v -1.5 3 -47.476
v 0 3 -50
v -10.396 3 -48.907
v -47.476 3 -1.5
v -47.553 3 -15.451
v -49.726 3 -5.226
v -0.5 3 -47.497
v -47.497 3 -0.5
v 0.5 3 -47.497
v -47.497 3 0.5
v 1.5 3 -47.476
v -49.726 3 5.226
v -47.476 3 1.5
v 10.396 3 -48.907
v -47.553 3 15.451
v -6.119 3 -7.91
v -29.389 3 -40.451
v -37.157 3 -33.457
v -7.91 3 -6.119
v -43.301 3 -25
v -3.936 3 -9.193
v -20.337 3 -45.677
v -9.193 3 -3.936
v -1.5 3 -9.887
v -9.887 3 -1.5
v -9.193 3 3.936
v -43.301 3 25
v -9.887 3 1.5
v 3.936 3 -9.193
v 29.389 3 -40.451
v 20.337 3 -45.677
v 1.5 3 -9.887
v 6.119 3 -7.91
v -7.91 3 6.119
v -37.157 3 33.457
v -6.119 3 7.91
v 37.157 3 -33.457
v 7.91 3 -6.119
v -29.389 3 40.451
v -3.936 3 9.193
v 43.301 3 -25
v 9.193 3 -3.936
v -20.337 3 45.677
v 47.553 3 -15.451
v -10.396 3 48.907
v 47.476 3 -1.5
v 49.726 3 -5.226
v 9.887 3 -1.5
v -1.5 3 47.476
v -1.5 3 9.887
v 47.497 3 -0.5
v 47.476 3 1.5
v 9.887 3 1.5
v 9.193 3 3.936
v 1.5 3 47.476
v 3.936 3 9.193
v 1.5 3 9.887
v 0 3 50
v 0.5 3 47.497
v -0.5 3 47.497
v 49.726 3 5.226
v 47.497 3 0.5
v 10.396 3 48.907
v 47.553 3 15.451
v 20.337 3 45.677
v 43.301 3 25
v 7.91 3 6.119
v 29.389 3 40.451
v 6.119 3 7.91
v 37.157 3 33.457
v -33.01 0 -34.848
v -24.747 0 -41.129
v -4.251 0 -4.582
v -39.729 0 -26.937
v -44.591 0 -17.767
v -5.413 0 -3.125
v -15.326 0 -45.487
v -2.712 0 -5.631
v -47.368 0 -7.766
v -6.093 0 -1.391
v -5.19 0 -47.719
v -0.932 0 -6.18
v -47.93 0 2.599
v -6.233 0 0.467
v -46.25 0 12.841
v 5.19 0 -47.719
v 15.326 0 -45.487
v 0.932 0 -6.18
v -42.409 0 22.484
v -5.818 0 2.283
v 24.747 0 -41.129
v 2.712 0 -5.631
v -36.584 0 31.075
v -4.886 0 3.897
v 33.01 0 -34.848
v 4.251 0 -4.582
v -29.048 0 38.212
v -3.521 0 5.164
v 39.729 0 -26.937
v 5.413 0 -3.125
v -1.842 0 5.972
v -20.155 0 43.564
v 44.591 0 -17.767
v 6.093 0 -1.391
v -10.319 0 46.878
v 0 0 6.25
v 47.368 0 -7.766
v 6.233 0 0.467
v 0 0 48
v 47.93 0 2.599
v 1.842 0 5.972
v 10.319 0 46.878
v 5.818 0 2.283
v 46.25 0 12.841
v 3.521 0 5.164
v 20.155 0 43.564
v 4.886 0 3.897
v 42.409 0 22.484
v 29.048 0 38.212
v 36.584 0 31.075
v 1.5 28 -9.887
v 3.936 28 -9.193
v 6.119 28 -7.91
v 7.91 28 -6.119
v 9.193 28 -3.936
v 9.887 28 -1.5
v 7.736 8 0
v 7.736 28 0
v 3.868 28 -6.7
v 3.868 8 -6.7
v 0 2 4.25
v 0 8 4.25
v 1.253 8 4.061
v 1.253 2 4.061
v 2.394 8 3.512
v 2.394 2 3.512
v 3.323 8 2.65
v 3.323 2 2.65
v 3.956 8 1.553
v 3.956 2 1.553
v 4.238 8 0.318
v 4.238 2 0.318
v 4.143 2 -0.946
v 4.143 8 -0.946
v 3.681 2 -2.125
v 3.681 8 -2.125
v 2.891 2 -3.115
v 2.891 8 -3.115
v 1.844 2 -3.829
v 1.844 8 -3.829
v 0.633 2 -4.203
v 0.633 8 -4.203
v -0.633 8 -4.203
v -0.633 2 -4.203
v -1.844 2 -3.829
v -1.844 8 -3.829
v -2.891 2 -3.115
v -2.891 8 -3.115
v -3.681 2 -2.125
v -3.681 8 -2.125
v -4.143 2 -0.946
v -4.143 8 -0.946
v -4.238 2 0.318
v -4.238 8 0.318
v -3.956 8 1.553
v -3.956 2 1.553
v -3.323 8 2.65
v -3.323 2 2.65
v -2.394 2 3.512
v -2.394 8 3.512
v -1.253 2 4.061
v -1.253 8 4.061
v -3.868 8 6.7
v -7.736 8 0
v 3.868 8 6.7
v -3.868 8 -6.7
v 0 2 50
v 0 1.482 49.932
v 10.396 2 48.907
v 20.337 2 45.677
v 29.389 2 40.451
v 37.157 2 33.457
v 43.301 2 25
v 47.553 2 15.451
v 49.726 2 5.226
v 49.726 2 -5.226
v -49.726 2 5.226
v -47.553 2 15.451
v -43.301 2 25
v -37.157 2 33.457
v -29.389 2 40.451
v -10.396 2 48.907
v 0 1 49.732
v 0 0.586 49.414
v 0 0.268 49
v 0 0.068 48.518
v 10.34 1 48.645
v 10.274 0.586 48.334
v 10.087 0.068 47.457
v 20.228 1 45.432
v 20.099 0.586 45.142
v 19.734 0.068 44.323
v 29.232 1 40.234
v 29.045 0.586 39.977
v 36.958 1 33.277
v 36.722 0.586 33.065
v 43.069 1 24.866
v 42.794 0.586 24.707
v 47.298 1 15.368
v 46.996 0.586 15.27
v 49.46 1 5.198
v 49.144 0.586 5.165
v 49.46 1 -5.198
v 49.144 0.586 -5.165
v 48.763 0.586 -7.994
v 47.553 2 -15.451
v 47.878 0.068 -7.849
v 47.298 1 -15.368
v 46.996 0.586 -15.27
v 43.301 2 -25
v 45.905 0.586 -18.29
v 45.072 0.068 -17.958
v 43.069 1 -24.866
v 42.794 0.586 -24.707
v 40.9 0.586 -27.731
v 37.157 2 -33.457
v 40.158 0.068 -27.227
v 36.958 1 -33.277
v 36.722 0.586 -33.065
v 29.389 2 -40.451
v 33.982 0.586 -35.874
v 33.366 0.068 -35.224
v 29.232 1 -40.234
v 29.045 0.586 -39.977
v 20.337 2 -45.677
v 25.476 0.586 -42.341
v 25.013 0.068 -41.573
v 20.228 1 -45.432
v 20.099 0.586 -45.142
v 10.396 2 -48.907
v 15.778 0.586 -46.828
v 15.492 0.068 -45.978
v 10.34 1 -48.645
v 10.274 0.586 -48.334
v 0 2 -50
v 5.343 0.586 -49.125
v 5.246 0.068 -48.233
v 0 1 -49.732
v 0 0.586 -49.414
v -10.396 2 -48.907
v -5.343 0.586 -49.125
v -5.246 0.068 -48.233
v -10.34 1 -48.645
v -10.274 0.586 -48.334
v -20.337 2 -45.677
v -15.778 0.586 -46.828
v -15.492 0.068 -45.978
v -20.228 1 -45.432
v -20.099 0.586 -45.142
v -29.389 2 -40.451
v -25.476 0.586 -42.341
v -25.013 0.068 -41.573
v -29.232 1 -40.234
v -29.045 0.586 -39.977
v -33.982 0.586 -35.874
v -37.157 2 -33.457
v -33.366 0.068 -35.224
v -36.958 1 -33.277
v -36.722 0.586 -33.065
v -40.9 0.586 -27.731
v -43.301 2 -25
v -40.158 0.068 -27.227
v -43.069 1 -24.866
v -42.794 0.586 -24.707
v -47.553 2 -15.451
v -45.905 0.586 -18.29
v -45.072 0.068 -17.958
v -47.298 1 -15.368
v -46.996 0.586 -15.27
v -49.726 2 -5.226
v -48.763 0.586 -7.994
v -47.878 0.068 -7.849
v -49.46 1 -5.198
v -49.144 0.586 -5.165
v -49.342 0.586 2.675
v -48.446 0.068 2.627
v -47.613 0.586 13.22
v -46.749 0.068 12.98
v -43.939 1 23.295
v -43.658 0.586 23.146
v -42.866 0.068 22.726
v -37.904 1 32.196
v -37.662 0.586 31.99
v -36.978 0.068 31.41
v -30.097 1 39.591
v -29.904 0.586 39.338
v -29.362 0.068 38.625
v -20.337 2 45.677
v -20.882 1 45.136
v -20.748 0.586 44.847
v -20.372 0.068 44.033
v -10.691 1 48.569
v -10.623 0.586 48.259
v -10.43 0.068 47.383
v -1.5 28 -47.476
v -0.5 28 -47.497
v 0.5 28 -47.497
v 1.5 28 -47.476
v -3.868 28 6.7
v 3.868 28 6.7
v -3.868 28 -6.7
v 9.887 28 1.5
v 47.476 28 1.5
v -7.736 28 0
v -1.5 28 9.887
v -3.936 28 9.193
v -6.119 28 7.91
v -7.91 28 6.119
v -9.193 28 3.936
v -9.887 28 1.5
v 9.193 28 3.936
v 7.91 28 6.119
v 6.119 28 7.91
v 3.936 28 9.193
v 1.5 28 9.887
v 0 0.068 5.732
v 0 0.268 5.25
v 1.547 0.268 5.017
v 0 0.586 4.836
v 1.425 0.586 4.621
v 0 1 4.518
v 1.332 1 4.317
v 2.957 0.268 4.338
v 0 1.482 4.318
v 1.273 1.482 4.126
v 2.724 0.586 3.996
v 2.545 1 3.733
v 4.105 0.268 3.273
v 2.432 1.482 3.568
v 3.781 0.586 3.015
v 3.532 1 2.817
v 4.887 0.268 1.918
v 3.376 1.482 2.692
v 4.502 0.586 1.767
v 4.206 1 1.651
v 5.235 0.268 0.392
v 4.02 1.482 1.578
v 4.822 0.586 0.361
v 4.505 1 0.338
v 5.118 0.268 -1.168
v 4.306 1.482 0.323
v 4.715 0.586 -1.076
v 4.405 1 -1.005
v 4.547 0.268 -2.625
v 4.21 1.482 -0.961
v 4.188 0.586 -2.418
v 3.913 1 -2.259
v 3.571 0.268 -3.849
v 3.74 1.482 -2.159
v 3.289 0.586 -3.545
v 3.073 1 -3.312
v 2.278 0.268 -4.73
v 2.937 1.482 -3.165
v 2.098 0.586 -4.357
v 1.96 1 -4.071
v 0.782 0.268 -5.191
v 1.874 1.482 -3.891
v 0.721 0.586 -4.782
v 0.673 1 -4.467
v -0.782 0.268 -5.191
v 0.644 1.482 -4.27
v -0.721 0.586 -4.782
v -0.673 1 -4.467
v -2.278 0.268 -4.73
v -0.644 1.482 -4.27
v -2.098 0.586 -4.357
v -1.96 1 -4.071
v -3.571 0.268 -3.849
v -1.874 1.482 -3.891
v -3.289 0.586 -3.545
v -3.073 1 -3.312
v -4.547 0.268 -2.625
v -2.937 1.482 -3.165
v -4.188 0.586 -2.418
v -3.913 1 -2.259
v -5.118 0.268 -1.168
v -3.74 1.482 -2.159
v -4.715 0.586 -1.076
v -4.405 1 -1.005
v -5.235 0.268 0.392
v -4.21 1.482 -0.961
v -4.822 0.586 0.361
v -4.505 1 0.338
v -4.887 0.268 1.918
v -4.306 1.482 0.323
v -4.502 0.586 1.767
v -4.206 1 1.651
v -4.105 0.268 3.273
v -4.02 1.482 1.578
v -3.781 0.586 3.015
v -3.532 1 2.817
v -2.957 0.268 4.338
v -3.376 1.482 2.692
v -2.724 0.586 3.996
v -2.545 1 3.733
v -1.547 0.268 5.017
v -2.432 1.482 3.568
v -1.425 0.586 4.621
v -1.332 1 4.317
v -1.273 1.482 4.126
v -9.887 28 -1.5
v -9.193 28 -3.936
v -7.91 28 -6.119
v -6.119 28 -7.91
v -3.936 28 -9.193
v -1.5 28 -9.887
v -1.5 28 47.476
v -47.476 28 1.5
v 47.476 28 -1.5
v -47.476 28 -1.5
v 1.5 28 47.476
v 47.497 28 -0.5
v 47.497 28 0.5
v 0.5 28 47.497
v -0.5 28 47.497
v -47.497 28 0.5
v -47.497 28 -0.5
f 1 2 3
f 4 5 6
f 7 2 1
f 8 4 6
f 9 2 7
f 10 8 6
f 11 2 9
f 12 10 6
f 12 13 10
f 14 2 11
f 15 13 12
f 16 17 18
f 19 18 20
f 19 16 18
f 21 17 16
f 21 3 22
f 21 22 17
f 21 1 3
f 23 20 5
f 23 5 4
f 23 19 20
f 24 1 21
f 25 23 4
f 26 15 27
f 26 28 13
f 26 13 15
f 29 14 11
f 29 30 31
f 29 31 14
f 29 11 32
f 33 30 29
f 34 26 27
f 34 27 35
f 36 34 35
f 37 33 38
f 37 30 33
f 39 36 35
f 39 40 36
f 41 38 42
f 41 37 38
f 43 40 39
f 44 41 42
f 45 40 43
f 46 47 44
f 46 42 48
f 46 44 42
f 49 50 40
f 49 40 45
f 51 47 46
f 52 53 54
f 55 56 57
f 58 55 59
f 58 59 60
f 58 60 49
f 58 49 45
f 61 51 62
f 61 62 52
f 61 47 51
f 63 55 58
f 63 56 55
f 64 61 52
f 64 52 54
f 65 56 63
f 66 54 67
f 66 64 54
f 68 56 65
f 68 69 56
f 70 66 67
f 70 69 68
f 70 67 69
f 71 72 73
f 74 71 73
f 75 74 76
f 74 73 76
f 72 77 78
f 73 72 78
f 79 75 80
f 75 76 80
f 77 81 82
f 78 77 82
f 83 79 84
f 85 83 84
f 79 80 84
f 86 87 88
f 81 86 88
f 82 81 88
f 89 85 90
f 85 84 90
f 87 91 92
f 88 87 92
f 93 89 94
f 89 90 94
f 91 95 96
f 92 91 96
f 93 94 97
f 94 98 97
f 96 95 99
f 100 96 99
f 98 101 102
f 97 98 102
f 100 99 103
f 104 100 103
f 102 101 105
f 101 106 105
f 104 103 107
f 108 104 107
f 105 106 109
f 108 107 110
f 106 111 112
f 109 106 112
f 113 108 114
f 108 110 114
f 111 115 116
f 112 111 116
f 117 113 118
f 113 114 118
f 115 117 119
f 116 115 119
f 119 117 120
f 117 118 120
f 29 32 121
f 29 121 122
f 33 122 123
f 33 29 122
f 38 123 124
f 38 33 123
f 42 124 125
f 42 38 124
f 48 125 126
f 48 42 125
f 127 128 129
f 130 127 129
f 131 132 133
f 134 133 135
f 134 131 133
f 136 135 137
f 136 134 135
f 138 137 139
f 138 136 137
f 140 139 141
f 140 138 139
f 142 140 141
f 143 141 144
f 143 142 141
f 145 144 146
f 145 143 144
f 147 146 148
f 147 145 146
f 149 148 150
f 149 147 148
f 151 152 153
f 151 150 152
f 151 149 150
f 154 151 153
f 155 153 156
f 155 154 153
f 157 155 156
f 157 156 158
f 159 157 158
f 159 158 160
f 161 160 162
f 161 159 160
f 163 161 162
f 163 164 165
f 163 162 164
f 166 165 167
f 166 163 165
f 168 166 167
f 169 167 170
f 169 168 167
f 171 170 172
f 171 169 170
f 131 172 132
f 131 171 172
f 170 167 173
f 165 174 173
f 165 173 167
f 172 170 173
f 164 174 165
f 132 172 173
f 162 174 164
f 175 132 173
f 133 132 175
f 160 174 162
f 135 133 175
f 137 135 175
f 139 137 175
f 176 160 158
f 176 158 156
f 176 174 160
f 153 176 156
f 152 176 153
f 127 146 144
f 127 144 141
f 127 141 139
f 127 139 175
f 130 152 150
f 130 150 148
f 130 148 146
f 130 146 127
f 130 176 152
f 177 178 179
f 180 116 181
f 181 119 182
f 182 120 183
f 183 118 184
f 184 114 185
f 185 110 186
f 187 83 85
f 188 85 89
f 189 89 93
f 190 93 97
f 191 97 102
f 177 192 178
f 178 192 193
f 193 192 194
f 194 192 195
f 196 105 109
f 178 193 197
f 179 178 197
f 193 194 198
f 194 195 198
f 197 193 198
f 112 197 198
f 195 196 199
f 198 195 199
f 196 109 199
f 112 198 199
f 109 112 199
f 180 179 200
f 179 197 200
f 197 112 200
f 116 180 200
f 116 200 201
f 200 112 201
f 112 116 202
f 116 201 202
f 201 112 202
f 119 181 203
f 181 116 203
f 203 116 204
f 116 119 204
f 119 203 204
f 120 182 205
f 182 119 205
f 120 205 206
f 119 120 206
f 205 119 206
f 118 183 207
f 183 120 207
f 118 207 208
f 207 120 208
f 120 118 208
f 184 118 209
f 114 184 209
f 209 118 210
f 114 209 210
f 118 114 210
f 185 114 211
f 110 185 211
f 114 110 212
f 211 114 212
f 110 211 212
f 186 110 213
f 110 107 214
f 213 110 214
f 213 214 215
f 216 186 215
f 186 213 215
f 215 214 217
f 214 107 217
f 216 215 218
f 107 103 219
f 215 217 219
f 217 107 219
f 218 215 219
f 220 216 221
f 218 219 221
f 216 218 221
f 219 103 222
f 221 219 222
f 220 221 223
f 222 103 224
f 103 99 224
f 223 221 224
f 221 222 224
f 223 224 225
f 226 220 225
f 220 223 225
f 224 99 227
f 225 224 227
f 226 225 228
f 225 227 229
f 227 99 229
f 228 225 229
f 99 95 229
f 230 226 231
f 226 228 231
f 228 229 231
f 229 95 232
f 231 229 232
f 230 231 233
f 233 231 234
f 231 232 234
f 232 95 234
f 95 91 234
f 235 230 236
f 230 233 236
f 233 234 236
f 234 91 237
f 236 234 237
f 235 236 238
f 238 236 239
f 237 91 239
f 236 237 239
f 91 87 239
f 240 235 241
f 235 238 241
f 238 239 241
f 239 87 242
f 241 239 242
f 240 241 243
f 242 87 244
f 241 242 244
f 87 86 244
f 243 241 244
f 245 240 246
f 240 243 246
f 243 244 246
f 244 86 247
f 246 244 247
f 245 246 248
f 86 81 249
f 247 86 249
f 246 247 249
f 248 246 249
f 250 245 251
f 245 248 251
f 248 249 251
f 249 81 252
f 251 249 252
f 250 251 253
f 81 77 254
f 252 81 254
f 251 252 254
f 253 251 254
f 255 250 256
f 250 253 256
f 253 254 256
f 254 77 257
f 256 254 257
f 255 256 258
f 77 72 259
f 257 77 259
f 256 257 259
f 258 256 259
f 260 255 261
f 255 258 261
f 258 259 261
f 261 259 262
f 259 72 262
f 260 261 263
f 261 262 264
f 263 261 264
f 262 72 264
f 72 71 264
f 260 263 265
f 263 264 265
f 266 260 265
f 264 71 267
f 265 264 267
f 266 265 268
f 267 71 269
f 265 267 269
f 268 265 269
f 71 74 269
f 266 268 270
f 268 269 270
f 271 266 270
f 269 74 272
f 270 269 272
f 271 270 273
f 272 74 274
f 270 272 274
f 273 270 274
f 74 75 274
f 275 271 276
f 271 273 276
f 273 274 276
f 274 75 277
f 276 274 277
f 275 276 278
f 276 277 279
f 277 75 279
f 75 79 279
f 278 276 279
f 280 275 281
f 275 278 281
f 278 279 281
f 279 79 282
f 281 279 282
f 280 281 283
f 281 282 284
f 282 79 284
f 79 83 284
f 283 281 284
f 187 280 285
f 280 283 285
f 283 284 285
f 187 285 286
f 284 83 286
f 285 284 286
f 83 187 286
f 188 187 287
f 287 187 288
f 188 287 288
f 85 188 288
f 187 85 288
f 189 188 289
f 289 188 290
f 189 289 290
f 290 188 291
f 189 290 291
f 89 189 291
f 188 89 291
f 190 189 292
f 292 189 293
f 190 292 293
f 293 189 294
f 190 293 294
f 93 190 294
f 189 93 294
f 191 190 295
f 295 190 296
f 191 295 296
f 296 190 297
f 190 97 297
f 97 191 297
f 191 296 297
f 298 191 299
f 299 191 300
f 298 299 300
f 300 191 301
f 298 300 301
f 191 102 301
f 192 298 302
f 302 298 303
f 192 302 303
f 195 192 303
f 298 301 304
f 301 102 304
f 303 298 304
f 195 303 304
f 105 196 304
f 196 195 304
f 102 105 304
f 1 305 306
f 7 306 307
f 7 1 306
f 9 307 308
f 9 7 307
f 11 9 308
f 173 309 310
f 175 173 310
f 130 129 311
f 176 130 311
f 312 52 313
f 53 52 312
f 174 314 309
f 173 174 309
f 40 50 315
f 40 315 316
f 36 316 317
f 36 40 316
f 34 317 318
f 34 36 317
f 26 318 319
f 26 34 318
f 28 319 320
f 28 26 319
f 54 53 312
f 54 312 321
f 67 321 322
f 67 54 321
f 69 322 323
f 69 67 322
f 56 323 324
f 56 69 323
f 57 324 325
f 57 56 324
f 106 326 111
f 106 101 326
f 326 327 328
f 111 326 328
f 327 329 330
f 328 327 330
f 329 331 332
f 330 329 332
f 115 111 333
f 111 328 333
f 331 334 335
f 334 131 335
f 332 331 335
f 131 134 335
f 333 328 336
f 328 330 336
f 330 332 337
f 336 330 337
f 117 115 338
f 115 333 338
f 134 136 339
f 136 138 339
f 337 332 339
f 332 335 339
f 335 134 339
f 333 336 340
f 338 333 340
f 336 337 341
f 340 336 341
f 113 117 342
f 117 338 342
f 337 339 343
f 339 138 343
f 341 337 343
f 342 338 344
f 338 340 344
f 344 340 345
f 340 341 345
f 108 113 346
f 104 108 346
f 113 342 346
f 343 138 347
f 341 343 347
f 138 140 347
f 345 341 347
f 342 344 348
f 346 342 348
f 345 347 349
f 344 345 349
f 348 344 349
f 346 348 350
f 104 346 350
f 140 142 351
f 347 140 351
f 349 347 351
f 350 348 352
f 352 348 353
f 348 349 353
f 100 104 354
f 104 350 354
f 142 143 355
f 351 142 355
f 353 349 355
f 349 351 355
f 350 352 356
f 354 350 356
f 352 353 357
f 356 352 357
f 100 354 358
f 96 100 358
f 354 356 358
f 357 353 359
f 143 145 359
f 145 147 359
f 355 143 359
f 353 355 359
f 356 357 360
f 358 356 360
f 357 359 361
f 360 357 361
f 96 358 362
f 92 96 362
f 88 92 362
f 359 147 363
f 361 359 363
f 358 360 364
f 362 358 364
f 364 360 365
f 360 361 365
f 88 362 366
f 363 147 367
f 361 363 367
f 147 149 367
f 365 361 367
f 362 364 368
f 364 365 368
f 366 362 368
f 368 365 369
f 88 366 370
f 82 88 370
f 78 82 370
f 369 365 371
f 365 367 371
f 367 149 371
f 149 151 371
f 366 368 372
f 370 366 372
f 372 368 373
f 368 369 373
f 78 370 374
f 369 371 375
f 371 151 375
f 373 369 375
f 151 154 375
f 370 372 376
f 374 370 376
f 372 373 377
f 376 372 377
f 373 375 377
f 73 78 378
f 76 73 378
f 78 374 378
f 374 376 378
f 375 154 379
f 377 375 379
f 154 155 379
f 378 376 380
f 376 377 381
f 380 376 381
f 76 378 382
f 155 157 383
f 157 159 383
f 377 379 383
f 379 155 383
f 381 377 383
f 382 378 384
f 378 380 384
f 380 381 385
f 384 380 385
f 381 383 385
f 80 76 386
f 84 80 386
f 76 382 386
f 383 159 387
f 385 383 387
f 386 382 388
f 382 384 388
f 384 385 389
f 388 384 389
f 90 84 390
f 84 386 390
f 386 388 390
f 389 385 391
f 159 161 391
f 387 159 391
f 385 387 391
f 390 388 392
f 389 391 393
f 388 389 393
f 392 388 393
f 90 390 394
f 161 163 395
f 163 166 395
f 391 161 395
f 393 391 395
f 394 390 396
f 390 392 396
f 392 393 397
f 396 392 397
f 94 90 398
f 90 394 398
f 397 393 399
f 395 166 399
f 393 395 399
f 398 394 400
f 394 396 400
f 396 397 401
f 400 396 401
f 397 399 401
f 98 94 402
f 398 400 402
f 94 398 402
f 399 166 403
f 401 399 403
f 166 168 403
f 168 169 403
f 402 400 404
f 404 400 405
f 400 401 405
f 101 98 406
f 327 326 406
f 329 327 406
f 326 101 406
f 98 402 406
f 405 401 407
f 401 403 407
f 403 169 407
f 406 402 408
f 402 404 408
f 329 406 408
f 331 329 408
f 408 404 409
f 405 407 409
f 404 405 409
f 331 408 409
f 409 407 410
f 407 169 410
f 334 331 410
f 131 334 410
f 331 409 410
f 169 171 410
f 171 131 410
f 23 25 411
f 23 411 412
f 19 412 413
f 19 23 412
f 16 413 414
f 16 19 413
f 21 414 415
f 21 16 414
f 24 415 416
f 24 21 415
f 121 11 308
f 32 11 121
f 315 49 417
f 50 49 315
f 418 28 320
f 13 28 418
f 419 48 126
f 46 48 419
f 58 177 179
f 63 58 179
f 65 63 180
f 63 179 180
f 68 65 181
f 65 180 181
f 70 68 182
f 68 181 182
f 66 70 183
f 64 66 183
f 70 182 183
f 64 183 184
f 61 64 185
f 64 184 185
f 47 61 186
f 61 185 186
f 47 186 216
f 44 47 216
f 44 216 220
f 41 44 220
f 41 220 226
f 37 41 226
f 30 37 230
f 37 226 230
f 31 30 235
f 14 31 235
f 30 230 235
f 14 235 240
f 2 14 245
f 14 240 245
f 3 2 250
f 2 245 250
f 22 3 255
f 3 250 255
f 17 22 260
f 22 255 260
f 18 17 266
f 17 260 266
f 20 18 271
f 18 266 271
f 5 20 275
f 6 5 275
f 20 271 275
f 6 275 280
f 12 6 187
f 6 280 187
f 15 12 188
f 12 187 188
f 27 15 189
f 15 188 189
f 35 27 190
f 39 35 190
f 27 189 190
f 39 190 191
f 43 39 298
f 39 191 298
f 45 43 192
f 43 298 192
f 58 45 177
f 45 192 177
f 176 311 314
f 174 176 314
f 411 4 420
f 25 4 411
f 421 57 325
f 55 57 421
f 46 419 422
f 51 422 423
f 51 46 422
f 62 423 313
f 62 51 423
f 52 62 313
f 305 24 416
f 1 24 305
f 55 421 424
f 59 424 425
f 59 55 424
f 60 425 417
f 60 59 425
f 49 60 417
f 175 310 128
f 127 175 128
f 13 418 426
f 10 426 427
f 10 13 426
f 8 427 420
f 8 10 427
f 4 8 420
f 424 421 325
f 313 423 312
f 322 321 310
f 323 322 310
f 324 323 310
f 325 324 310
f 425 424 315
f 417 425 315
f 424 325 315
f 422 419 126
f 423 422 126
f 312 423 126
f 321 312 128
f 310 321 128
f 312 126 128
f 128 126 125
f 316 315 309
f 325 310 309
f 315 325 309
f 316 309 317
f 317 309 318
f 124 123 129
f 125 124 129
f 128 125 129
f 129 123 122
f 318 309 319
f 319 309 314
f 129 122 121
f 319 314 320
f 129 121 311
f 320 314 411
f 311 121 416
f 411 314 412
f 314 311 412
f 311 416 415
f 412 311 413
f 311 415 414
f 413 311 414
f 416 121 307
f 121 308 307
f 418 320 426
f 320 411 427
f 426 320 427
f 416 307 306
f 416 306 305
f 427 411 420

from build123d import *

# Parameters (mm, degrees)
ESQUISSE1_R             = 50
ESQUISSE1_R_2           = 4.25
BOSS_EXTRU_1_DEPTH      = 3
ESQUISSE2_R             = 4.25
BOSS_EXTRU_2_DEPTH      = 25
ENL_V_MAT_EXTRU_1_DEPTH = 20
CONG_1_R                = 2


with BuildPart() as part:
    # Esquisse1 → Boss.-Extru.1 (new body)
    with BuildSketch(Plane(origin=(0, 0, 0), x_dir=(1, 0, 0), z_dir=(0, 1, 0))):
        with Locations(Location((0, 0, 0), (0, 0, 270))):
            Circle(ESQUISSE1_R)
        with Locations(Location((0, 0, 0), (0, 0, 270))):
            Circle(ESQUISSE1_R_2, mode=Mode.SUBTRACT)
    extrude(amount=BOSS_EXTRU_1_DEPTH)

    # Esquisse2 → Boss.-Extru.2 (add)
    with BuildSketch(Plane(origin=(0, 3, 0), x_dir=(1, 0, 0), z_dir=(0, 1, 0))):
        with BuildLine():
            Line((9.886859967, 1.5), (47.476309882, 1.5))
            ThreePointArc((47.476309882, 1.5), (47.5, 0), (47.476309882, -1.5))
            Line((47.476309882, -1.5), (9.886859967, -1.5))
            ThreePointArc((9.886859967, -1.5), (7.071067812, -7.071067812), (1.5, -9.886859967))
            Line((1.5, -9.886859967), (1.5, -47.476309882))
            ThreePointArc((1.5, -47.476309882), (0, -47.5), (-1.5, -47.476309882))
            Line((-1.5, -47.476309882), (-1.5, -9.886859967))
            ThreePointArc((-1.5, -9.886859967), (-7.071067812, -7.071067812), (-9.886859967, -1.5))
            Line((-9.886859967, -1.5), (-47.476309882, -1.5))
            ThreePointArc((-47.476309882, -1.5), (-47.5, 0), (-47.476309882, 1.5))
            Line((-47.476309882, 1.5), (-9.886859967, 1.5))
            ThreePointArc((-9.886859967, 1.5), (-7.071067812, 7.071067812), (-1.5, 9.886859967))
            Line((-1.5, 9.886859967), (-1.5, 47.476309882))
            ThreePointArc((-1.5, 47.476309882), (0, 47.5), (1.5, 47.476309882))
            Line((1.5, 47.476309882), (1.5, 9.886859967))
            ThreePointArc((1.5, 9.886859967), (7.071067812, 7.071067812), (9.886859967, 1.5))
        make_face()
        with Locations(Location((0, 0, 0), (0, 0, 270))):
            Circle(ESQUISSE2_R, mode=Mode.SUBTRACT)
    extrude(amount=BOSS_EXTRU_2_DEPTH)

    # Esquisse3 → Enlèv. mat.-Extru.1 (cut)
    with BuildSketch(Plane(origin=(0, 28, 0), x_dir=(1, 0, 0), z_dir=(0, 1, 0))):
        Polygon((7.736493607, 0), (3.868246804, 6.7), (-3.868246804, 6.7), (-7.736493607, 0), (-3.868246804, -6.7), (3.868246804, -6.7), align=None)
    extrude(amount=-ENL_V_MAT_EXTRU_1_DEPTH, mode=Mode.SUBTRACT)

    # Congé1
    cong_1_edges = [part.edges().sort_by_distance(p)[0] for p in [
        (0, 0, -50),
        (0, 0, -4.25),
    ]]
    fillet(cong_1_edges, radius=CONG_1_R)


solid = part.part
